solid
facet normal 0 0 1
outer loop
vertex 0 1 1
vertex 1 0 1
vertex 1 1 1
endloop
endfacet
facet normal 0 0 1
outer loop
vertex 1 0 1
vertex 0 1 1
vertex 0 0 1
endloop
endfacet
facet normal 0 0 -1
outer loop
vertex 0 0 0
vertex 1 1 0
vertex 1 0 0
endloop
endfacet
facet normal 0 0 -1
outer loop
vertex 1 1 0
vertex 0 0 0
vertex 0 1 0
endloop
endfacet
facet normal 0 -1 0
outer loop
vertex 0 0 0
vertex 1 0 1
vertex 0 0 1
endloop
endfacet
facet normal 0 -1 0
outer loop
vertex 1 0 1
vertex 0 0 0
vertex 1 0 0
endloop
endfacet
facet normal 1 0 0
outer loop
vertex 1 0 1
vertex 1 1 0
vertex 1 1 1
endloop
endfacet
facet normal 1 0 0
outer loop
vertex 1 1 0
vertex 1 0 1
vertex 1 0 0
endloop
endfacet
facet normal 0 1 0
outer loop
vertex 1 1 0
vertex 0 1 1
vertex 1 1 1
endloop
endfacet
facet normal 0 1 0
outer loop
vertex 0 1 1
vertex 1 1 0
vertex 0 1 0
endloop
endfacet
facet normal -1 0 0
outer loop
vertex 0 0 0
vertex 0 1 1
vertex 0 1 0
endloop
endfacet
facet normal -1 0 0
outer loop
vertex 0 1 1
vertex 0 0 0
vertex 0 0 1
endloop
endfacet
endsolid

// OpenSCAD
// negative: a function that returns a module
// expect-reject-line: 3
function body() = cube([10, 10, 2]);
cube(1);
